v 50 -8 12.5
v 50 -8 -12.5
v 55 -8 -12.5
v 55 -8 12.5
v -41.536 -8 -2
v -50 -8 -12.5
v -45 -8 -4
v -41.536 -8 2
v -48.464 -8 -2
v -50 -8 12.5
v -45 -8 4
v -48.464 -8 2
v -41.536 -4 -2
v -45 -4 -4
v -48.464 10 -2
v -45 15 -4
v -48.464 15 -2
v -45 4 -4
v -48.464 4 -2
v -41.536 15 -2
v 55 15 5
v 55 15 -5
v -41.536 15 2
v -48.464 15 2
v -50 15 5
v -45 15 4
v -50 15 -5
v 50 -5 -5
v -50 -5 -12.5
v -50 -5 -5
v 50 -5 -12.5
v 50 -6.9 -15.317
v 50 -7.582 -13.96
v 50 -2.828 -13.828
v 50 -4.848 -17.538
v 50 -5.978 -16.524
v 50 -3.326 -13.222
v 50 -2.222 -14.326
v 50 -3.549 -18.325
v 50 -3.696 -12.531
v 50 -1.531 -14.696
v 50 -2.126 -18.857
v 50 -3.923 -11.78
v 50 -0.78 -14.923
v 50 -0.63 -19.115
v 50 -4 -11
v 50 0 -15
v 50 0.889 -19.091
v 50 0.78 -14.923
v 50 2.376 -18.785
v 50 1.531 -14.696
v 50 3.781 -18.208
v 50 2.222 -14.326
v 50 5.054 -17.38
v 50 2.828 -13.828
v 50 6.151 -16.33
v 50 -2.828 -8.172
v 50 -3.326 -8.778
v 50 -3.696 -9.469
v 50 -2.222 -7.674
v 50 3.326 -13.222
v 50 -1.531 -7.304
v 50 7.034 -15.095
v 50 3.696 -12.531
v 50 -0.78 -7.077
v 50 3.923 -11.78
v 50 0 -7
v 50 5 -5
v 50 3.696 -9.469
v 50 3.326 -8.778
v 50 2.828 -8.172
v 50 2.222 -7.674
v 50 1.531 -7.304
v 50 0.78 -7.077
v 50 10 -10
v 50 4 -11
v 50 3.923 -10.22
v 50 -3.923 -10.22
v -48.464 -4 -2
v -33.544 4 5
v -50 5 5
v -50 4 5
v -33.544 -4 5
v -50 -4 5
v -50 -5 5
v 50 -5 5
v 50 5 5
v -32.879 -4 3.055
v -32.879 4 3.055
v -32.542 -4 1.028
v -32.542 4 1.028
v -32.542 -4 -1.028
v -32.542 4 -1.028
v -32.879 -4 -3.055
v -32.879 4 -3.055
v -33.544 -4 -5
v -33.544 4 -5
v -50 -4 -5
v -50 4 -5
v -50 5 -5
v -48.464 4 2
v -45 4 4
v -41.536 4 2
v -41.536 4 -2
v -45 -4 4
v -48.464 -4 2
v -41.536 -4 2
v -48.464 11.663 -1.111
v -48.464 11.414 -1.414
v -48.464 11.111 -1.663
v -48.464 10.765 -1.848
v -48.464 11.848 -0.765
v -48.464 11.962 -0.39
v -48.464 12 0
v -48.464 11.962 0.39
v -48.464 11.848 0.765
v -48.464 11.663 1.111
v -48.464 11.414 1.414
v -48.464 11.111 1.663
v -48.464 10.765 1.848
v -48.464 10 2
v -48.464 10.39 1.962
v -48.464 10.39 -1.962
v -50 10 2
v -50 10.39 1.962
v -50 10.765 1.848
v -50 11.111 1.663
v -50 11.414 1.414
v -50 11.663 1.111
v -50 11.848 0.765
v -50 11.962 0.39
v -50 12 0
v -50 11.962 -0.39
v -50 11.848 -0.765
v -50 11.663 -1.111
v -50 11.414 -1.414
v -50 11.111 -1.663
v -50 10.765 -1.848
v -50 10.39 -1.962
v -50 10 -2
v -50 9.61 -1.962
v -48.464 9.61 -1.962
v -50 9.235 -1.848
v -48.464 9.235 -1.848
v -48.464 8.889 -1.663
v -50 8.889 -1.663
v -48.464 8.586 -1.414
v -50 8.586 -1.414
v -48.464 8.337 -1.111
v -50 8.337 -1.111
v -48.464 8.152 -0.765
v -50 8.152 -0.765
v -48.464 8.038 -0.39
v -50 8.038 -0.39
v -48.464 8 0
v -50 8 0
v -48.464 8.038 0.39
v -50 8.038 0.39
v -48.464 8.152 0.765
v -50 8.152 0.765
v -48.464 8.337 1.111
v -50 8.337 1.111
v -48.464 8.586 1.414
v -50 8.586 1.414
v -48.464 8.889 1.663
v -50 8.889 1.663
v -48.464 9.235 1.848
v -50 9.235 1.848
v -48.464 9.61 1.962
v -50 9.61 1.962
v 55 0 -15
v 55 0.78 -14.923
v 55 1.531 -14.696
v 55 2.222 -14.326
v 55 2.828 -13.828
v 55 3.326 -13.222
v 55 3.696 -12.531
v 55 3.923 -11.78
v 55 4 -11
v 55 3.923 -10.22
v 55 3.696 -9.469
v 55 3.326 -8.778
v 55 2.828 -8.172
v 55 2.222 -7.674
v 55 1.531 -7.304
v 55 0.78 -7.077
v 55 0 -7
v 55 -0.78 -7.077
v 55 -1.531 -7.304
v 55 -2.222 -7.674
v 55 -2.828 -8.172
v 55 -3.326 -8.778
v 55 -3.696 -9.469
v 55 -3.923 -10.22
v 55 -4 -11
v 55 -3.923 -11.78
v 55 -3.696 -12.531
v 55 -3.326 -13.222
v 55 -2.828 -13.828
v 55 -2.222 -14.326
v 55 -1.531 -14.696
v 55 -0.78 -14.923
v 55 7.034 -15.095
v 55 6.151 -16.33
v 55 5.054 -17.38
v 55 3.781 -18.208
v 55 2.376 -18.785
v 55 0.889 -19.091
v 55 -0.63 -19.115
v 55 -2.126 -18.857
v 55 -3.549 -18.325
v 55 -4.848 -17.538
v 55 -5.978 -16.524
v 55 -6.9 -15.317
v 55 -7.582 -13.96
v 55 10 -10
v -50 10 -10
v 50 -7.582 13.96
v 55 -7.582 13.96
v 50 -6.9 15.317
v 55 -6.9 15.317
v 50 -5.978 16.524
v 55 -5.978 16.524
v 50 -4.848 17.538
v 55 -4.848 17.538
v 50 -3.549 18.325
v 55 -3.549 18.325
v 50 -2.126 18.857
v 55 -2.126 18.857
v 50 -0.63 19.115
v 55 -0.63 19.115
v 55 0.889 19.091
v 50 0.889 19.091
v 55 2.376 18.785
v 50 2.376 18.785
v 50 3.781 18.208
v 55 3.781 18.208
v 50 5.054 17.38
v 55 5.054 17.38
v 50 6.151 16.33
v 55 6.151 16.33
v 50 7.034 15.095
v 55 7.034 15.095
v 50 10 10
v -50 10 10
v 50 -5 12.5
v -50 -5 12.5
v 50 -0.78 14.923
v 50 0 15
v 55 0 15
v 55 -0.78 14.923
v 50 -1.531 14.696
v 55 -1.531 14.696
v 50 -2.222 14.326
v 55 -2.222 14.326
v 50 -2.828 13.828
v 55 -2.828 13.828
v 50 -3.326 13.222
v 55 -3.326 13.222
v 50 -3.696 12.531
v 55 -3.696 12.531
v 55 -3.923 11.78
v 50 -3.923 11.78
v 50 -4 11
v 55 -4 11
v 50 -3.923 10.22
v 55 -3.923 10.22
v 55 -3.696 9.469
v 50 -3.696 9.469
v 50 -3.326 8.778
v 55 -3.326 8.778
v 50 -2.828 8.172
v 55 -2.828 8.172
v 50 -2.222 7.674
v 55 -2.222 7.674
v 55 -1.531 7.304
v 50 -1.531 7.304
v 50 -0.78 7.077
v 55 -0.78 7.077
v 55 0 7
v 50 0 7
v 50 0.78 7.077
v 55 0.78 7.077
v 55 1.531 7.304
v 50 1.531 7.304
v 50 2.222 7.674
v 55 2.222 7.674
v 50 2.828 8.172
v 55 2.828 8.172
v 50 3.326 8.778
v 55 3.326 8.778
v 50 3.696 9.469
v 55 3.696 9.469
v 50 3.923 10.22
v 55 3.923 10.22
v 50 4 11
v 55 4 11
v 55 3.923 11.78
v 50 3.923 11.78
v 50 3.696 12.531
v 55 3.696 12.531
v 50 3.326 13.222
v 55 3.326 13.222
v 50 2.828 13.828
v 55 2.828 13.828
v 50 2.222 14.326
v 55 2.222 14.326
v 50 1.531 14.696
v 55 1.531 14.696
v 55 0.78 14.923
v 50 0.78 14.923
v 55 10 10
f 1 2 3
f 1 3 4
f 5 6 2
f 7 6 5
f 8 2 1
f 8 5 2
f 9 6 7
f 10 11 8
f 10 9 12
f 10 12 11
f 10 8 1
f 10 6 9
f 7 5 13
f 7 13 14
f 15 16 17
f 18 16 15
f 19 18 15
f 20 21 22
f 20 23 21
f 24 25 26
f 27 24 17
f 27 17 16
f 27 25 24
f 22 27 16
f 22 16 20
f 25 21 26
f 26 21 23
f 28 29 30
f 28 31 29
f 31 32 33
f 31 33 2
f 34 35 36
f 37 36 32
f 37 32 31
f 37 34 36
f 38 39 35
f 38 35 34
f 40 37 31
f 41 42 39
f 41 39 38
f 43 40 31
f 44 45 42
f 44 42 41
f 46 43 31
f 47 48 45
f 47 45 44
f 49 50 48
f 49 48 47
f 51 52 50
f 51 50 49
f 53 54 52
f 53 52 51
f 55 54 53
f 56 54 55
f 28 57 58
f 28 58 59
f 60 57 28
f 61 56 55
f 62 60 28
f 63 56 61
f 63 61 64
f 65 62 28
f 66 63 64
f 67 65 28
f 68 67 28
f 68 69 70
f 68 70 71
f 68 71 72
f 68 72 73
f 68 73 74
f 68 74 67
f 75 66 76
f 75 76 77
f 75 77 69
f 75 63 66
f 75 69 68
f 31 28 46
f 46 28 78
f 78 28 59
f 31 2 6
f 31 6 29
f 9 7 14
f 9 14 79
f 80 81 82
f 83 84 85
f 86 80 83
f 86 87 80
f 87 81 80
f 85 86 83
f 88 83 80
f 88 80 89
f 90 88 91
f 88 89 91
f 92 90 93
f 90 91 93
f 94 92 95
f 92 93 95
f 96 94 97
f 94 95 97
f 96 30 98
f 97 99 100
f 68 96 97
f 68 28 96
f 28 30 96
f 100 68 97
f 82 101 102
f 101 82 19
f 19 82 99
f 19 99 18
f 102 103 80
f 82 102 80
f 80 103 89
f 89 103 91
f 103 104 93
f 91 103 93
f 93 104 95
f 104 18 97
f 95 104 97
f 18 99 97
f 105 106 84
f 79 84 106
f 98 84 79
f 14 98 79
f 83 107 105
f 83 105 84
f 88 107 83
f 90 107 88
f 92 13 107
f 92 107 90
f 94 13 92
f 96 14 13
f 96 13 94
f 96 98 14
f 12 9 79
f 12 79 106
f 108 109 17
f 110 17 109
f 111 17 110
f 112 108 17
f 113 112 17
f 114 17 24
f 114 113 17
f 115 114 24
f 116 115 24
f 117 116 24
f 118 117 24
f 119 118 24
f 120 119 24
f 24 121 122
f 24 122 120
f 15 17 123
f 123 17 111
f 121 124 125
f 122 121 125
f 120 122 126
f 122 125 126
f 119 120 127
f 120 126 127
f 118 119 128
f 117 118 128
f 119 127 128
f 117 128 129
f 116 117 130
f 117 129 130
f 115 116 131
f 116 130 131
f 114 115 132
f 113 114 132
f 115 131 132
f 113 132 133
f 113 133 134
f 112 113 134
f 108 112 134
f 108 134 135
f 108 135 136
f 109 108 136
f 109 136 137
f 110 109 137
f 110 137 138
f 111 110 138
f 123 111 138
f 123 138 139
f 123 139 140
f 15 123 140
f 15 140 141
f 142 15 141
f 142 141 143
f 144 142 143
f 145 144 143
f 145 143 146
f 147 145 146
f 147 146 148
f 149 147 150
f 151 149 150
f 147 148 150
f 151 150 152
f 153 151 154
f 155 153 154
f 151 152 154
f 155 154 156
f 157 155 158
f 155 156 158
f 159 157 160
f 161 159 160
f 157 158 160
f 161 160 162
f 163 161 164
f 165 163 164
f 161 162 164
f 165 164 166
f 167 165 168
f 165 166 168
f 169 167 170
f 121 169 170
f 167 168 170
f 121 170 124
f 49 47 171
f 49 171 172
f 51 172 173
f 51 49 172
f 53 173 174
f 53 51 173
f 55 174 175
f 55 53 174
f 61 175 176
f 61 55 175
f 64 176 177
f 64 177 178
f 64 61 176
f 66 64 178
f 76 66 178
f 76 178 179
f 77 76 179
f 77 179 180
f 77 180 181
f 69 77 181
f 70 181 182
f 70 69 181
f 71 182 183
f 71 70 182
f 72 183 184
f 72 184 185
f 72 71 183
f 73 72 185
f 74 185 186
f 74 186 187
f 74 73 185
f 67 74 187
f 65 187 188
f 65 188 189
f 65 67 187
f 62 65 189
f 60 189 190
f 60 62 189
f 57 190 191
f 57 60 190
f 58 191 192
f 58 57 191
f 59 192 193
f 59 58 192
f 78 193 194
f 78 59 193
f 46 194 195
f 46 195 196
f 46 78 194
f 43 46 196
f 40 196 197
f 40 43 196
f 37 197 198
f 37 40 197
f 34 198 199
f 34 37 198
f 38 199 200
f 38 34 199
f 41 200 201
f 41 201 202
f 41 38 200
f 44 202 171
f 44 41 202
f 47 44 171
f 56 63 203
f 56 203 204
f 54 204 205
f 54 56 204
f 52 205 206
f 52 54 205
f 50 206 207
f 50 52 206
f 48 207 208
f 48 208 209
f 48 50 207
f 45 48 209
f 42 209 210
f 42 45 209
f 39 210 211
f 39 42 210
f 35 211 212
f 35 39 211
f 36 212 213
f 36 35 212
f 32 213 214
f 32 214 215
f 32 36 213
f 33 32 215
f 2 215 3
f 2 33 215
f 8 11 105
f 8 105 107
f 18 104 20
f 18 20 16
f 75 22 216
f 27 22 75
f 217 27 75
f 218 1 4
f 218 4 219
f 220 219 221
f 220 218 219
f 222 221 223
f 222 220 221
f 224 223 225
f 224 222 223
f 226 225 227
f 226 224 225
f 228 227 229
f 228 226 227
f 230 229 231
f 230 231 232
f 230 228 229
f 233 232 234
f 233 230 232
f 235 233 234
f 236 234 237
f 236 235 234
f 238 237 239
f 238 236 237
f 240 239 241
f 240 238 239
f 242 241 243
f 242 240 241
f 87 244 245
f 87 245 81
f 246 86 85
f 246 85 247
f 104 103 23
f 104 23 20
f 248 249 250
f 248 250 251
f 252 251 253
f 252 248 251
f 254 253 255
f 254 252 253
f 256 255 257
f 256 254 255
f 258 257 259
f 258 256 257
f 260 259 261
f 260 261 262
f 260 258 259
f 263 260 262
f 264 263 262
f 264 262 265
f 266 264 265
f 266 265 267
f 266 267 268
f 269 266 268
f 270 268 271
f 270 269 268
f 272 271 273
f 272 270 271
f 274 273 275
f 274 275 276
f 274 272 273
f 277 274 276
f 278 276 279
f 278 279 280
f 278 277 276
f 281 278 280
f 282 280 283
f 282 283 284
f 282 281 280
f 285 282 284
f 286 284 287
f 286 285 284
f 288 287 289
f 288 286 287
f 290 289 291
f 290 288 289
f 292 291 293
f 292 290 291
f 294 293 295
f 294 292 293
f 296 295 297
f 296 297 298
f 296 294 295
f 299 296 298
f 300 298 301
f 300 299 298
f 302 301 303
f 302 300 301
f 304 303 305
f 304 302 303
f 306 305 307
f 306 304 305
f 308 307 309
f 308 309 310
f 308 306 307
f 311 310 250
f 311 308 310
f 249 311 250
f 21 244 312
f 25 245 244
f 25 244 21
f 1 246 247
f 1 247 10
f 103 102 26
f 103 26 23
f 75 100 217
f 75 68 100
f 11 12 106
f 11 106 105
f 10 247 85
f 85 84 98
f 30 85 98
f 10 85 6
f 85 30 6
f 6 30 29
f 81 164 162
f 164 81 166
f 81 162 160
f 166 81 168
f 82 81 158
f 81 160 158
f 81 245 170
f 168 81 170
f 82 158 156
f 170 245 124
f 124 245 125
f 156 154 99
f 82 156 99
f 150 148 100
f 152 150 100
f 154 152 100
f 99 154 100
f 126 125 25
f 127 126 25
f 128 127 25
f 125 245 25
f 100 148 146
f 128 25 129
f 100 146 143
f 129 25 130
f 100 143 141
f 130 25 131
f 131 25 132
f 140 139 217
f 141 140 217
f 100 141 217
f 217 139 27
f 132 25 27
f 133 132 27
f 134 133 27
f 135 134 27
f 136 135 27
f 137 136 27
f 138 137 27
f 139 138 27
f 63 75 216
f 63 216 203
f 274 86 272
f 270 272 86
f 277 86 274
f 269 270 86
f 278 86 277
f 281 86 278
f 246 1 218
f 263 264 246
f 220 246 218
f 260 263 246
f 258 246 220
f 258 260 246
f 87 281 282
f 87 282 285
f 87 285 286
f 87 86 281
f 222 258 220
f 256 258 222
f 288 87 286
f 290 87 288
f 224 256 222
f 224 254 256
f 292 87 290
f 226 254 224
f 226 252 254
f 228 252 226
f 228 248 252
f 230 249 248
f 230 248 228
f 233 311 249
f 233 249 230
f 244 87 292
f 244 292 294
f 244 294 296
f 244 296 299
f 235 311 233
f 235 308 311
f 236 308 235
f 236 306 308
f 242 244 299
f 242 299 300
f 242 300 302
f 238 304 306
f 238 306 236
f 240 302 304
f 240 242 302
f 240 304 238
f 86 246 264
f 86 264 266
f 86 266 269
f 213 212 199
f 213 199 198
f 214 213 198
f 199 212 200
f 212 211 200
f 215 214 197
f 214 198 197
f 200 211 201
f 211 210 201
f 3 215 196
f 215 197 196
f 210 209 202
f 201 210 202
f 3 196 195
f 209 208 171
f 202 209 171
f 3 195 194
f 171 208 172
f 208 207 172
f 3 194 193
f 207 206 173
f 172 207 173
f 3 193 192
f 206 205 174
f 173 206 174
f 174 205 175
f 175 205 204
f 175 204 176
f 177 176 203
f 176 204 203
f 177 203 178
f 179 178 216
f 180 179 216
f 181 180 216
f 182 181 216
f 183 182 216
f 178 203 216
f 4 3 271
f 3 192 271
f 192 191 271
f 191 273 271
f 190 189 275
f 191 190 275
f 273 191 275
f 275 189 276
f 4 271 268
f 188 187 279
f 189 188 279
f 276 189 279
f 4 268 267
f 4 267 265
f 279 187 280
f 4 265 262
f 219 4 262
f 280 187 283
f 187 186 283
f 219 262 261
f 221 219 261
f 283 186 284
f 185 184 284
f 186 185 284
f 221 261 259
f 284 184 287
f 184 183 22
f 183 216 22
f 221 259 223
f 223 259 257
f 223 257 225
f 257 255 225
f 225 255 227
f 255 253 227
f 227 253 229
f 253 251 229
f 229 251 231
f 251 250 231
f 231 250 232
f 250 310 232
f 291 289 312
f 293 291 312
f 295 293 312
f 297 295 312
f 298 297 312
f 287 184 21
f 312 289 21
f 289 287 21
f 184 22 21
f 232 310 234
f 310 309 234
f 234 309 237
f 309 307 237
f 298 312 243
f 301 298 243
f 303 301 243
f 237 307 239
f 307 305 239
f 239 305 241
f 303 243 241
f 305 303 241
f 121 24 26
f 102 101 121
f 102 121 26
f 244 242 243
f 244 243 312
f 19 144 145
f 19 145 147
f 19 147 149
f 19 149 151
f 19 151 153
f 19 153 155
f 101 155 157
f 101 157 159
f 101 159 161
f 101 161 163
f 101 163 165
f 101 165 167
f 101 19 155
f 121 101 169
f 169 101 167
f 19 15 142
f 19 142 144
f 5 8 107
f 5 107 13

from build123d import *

# Parameters (mm, degrees)
BOSS_EXTRUDE1_DEPTH     = 50
SKETCH2_R               = 12.5
CUT_EXTRUDE1_DEPTH      = 4
CUT_EXTRUDE3_DEPTH      = 54.677276384
CUT_EXTRUDE3_DEPTH_BACK = 54.677276384
SKETCH6_R               = 2
CUT_EXTRUDE4_DEPTH      = 4
SKETCH7_R               = 4
BOSS_EXTRUDE3_DEPTH     = 5


with BuildPart() as part:
    # Sketch1 → Boss-Extrude1 (new, symmetric)
    with BuildSketch(Plane(origin=(0, 0, 0), x_dir=(0, 0, -1), z_dir=(1, 0, 0))):
        Polygon((5, 5), (10, 10), (5, 15), (-5, 15), (-10, 10), (-5, 5), (-5, -5), (-12.5, -5), (-12.5, -8), (12.5, -8), (12.5, -5), (5, -5), align=None)
    extrude(amount=BOSS_EXTRUDE1_DEPTH, both=True)

    # Sketch2 → Cut-Extrude1 (cut, symmetric)
    with BuildSketch(Plane(origin=(0, 0, 0), x_dir=(1, 0, 0), z_dir=(0, 1, 0))):
        with Locations((-45, 0)):
            Circle(SKETCH2_R)
    extrude(amount=CUT_EXTRUDE1_DEPTH, both=True, mode=Mode.SUBTRACT)

    # Sketch4 → Cut-Extrude3 (cut, two sides: drawn at the far end of the back side and taken through both)
    with BuildSketch(Plane(origin=(0, 0, 0), x_dir=(1, 0, 0), z_dir=(0, 1, 0)).offset(-CUT_EXTRUDE3_DEPTH_BACK)):
        Polygon((-45, -4), (-41.535898385, -2), (-41.535898385, 2), (-45, 4), (-48.464101615, 2), (-48.464101615, -2), align=None)
    extrude(amount=CUT_EXTRUDE3_DEPTH + CUT_EXTRUDE3_DEPTH_BACK, mode=Mode.SUBTRACT)

    # Sketch6 → Cut-Extrude4 (cut)
    with BuildSketch(Plane.ZY.offset(50)):
        with Locations((0, 10)):
            Circle(SKETCH6_R)
    extrude(amount=-CUT_EXTRUDE4_DEPTH, mode=Mode.SUBTRACT)

    # Sketch7 → Boss-Extrude3 (add)
    with BuildSketch(Plane(origin=(50, 0, 0), x_dir=(0, 0, -1), z_dir=(1, 0, 0))):
        with BuildLine():
            Line((10, 10), (15.094664958, 7.034466496))
            ThreePointArc((15.094664958, 7.034466496), (19.020839401, -1.384245389), (12.5, -8))
            Line((12.5, -8), (-12.5, -8))
            ThreePointArc((-12.5, -8), (-19.020839401, -1.384245389), (-15.094664958, 7.034466496))
            Line((-15.094664958, 7.034466496), (-10, 10))
            Line((-10, 10), (-5, 15))
            Line((-5, 15), (5, 15))
            Line((5, 15), (10, 10))
        make_face()
        with Locations((11, 0)):
            Circle(SKETCH7_R, mode=Mode.SUBTRACT)
        with Locations(Location((-11, 0, 0), (0, 0, 180))):
            Circle(SKETCH7_R, mode=Mode.SUBTRACT)
    extrude(amount=BOSS_EXTRUDE3_DEPTH)


solid = part.part
